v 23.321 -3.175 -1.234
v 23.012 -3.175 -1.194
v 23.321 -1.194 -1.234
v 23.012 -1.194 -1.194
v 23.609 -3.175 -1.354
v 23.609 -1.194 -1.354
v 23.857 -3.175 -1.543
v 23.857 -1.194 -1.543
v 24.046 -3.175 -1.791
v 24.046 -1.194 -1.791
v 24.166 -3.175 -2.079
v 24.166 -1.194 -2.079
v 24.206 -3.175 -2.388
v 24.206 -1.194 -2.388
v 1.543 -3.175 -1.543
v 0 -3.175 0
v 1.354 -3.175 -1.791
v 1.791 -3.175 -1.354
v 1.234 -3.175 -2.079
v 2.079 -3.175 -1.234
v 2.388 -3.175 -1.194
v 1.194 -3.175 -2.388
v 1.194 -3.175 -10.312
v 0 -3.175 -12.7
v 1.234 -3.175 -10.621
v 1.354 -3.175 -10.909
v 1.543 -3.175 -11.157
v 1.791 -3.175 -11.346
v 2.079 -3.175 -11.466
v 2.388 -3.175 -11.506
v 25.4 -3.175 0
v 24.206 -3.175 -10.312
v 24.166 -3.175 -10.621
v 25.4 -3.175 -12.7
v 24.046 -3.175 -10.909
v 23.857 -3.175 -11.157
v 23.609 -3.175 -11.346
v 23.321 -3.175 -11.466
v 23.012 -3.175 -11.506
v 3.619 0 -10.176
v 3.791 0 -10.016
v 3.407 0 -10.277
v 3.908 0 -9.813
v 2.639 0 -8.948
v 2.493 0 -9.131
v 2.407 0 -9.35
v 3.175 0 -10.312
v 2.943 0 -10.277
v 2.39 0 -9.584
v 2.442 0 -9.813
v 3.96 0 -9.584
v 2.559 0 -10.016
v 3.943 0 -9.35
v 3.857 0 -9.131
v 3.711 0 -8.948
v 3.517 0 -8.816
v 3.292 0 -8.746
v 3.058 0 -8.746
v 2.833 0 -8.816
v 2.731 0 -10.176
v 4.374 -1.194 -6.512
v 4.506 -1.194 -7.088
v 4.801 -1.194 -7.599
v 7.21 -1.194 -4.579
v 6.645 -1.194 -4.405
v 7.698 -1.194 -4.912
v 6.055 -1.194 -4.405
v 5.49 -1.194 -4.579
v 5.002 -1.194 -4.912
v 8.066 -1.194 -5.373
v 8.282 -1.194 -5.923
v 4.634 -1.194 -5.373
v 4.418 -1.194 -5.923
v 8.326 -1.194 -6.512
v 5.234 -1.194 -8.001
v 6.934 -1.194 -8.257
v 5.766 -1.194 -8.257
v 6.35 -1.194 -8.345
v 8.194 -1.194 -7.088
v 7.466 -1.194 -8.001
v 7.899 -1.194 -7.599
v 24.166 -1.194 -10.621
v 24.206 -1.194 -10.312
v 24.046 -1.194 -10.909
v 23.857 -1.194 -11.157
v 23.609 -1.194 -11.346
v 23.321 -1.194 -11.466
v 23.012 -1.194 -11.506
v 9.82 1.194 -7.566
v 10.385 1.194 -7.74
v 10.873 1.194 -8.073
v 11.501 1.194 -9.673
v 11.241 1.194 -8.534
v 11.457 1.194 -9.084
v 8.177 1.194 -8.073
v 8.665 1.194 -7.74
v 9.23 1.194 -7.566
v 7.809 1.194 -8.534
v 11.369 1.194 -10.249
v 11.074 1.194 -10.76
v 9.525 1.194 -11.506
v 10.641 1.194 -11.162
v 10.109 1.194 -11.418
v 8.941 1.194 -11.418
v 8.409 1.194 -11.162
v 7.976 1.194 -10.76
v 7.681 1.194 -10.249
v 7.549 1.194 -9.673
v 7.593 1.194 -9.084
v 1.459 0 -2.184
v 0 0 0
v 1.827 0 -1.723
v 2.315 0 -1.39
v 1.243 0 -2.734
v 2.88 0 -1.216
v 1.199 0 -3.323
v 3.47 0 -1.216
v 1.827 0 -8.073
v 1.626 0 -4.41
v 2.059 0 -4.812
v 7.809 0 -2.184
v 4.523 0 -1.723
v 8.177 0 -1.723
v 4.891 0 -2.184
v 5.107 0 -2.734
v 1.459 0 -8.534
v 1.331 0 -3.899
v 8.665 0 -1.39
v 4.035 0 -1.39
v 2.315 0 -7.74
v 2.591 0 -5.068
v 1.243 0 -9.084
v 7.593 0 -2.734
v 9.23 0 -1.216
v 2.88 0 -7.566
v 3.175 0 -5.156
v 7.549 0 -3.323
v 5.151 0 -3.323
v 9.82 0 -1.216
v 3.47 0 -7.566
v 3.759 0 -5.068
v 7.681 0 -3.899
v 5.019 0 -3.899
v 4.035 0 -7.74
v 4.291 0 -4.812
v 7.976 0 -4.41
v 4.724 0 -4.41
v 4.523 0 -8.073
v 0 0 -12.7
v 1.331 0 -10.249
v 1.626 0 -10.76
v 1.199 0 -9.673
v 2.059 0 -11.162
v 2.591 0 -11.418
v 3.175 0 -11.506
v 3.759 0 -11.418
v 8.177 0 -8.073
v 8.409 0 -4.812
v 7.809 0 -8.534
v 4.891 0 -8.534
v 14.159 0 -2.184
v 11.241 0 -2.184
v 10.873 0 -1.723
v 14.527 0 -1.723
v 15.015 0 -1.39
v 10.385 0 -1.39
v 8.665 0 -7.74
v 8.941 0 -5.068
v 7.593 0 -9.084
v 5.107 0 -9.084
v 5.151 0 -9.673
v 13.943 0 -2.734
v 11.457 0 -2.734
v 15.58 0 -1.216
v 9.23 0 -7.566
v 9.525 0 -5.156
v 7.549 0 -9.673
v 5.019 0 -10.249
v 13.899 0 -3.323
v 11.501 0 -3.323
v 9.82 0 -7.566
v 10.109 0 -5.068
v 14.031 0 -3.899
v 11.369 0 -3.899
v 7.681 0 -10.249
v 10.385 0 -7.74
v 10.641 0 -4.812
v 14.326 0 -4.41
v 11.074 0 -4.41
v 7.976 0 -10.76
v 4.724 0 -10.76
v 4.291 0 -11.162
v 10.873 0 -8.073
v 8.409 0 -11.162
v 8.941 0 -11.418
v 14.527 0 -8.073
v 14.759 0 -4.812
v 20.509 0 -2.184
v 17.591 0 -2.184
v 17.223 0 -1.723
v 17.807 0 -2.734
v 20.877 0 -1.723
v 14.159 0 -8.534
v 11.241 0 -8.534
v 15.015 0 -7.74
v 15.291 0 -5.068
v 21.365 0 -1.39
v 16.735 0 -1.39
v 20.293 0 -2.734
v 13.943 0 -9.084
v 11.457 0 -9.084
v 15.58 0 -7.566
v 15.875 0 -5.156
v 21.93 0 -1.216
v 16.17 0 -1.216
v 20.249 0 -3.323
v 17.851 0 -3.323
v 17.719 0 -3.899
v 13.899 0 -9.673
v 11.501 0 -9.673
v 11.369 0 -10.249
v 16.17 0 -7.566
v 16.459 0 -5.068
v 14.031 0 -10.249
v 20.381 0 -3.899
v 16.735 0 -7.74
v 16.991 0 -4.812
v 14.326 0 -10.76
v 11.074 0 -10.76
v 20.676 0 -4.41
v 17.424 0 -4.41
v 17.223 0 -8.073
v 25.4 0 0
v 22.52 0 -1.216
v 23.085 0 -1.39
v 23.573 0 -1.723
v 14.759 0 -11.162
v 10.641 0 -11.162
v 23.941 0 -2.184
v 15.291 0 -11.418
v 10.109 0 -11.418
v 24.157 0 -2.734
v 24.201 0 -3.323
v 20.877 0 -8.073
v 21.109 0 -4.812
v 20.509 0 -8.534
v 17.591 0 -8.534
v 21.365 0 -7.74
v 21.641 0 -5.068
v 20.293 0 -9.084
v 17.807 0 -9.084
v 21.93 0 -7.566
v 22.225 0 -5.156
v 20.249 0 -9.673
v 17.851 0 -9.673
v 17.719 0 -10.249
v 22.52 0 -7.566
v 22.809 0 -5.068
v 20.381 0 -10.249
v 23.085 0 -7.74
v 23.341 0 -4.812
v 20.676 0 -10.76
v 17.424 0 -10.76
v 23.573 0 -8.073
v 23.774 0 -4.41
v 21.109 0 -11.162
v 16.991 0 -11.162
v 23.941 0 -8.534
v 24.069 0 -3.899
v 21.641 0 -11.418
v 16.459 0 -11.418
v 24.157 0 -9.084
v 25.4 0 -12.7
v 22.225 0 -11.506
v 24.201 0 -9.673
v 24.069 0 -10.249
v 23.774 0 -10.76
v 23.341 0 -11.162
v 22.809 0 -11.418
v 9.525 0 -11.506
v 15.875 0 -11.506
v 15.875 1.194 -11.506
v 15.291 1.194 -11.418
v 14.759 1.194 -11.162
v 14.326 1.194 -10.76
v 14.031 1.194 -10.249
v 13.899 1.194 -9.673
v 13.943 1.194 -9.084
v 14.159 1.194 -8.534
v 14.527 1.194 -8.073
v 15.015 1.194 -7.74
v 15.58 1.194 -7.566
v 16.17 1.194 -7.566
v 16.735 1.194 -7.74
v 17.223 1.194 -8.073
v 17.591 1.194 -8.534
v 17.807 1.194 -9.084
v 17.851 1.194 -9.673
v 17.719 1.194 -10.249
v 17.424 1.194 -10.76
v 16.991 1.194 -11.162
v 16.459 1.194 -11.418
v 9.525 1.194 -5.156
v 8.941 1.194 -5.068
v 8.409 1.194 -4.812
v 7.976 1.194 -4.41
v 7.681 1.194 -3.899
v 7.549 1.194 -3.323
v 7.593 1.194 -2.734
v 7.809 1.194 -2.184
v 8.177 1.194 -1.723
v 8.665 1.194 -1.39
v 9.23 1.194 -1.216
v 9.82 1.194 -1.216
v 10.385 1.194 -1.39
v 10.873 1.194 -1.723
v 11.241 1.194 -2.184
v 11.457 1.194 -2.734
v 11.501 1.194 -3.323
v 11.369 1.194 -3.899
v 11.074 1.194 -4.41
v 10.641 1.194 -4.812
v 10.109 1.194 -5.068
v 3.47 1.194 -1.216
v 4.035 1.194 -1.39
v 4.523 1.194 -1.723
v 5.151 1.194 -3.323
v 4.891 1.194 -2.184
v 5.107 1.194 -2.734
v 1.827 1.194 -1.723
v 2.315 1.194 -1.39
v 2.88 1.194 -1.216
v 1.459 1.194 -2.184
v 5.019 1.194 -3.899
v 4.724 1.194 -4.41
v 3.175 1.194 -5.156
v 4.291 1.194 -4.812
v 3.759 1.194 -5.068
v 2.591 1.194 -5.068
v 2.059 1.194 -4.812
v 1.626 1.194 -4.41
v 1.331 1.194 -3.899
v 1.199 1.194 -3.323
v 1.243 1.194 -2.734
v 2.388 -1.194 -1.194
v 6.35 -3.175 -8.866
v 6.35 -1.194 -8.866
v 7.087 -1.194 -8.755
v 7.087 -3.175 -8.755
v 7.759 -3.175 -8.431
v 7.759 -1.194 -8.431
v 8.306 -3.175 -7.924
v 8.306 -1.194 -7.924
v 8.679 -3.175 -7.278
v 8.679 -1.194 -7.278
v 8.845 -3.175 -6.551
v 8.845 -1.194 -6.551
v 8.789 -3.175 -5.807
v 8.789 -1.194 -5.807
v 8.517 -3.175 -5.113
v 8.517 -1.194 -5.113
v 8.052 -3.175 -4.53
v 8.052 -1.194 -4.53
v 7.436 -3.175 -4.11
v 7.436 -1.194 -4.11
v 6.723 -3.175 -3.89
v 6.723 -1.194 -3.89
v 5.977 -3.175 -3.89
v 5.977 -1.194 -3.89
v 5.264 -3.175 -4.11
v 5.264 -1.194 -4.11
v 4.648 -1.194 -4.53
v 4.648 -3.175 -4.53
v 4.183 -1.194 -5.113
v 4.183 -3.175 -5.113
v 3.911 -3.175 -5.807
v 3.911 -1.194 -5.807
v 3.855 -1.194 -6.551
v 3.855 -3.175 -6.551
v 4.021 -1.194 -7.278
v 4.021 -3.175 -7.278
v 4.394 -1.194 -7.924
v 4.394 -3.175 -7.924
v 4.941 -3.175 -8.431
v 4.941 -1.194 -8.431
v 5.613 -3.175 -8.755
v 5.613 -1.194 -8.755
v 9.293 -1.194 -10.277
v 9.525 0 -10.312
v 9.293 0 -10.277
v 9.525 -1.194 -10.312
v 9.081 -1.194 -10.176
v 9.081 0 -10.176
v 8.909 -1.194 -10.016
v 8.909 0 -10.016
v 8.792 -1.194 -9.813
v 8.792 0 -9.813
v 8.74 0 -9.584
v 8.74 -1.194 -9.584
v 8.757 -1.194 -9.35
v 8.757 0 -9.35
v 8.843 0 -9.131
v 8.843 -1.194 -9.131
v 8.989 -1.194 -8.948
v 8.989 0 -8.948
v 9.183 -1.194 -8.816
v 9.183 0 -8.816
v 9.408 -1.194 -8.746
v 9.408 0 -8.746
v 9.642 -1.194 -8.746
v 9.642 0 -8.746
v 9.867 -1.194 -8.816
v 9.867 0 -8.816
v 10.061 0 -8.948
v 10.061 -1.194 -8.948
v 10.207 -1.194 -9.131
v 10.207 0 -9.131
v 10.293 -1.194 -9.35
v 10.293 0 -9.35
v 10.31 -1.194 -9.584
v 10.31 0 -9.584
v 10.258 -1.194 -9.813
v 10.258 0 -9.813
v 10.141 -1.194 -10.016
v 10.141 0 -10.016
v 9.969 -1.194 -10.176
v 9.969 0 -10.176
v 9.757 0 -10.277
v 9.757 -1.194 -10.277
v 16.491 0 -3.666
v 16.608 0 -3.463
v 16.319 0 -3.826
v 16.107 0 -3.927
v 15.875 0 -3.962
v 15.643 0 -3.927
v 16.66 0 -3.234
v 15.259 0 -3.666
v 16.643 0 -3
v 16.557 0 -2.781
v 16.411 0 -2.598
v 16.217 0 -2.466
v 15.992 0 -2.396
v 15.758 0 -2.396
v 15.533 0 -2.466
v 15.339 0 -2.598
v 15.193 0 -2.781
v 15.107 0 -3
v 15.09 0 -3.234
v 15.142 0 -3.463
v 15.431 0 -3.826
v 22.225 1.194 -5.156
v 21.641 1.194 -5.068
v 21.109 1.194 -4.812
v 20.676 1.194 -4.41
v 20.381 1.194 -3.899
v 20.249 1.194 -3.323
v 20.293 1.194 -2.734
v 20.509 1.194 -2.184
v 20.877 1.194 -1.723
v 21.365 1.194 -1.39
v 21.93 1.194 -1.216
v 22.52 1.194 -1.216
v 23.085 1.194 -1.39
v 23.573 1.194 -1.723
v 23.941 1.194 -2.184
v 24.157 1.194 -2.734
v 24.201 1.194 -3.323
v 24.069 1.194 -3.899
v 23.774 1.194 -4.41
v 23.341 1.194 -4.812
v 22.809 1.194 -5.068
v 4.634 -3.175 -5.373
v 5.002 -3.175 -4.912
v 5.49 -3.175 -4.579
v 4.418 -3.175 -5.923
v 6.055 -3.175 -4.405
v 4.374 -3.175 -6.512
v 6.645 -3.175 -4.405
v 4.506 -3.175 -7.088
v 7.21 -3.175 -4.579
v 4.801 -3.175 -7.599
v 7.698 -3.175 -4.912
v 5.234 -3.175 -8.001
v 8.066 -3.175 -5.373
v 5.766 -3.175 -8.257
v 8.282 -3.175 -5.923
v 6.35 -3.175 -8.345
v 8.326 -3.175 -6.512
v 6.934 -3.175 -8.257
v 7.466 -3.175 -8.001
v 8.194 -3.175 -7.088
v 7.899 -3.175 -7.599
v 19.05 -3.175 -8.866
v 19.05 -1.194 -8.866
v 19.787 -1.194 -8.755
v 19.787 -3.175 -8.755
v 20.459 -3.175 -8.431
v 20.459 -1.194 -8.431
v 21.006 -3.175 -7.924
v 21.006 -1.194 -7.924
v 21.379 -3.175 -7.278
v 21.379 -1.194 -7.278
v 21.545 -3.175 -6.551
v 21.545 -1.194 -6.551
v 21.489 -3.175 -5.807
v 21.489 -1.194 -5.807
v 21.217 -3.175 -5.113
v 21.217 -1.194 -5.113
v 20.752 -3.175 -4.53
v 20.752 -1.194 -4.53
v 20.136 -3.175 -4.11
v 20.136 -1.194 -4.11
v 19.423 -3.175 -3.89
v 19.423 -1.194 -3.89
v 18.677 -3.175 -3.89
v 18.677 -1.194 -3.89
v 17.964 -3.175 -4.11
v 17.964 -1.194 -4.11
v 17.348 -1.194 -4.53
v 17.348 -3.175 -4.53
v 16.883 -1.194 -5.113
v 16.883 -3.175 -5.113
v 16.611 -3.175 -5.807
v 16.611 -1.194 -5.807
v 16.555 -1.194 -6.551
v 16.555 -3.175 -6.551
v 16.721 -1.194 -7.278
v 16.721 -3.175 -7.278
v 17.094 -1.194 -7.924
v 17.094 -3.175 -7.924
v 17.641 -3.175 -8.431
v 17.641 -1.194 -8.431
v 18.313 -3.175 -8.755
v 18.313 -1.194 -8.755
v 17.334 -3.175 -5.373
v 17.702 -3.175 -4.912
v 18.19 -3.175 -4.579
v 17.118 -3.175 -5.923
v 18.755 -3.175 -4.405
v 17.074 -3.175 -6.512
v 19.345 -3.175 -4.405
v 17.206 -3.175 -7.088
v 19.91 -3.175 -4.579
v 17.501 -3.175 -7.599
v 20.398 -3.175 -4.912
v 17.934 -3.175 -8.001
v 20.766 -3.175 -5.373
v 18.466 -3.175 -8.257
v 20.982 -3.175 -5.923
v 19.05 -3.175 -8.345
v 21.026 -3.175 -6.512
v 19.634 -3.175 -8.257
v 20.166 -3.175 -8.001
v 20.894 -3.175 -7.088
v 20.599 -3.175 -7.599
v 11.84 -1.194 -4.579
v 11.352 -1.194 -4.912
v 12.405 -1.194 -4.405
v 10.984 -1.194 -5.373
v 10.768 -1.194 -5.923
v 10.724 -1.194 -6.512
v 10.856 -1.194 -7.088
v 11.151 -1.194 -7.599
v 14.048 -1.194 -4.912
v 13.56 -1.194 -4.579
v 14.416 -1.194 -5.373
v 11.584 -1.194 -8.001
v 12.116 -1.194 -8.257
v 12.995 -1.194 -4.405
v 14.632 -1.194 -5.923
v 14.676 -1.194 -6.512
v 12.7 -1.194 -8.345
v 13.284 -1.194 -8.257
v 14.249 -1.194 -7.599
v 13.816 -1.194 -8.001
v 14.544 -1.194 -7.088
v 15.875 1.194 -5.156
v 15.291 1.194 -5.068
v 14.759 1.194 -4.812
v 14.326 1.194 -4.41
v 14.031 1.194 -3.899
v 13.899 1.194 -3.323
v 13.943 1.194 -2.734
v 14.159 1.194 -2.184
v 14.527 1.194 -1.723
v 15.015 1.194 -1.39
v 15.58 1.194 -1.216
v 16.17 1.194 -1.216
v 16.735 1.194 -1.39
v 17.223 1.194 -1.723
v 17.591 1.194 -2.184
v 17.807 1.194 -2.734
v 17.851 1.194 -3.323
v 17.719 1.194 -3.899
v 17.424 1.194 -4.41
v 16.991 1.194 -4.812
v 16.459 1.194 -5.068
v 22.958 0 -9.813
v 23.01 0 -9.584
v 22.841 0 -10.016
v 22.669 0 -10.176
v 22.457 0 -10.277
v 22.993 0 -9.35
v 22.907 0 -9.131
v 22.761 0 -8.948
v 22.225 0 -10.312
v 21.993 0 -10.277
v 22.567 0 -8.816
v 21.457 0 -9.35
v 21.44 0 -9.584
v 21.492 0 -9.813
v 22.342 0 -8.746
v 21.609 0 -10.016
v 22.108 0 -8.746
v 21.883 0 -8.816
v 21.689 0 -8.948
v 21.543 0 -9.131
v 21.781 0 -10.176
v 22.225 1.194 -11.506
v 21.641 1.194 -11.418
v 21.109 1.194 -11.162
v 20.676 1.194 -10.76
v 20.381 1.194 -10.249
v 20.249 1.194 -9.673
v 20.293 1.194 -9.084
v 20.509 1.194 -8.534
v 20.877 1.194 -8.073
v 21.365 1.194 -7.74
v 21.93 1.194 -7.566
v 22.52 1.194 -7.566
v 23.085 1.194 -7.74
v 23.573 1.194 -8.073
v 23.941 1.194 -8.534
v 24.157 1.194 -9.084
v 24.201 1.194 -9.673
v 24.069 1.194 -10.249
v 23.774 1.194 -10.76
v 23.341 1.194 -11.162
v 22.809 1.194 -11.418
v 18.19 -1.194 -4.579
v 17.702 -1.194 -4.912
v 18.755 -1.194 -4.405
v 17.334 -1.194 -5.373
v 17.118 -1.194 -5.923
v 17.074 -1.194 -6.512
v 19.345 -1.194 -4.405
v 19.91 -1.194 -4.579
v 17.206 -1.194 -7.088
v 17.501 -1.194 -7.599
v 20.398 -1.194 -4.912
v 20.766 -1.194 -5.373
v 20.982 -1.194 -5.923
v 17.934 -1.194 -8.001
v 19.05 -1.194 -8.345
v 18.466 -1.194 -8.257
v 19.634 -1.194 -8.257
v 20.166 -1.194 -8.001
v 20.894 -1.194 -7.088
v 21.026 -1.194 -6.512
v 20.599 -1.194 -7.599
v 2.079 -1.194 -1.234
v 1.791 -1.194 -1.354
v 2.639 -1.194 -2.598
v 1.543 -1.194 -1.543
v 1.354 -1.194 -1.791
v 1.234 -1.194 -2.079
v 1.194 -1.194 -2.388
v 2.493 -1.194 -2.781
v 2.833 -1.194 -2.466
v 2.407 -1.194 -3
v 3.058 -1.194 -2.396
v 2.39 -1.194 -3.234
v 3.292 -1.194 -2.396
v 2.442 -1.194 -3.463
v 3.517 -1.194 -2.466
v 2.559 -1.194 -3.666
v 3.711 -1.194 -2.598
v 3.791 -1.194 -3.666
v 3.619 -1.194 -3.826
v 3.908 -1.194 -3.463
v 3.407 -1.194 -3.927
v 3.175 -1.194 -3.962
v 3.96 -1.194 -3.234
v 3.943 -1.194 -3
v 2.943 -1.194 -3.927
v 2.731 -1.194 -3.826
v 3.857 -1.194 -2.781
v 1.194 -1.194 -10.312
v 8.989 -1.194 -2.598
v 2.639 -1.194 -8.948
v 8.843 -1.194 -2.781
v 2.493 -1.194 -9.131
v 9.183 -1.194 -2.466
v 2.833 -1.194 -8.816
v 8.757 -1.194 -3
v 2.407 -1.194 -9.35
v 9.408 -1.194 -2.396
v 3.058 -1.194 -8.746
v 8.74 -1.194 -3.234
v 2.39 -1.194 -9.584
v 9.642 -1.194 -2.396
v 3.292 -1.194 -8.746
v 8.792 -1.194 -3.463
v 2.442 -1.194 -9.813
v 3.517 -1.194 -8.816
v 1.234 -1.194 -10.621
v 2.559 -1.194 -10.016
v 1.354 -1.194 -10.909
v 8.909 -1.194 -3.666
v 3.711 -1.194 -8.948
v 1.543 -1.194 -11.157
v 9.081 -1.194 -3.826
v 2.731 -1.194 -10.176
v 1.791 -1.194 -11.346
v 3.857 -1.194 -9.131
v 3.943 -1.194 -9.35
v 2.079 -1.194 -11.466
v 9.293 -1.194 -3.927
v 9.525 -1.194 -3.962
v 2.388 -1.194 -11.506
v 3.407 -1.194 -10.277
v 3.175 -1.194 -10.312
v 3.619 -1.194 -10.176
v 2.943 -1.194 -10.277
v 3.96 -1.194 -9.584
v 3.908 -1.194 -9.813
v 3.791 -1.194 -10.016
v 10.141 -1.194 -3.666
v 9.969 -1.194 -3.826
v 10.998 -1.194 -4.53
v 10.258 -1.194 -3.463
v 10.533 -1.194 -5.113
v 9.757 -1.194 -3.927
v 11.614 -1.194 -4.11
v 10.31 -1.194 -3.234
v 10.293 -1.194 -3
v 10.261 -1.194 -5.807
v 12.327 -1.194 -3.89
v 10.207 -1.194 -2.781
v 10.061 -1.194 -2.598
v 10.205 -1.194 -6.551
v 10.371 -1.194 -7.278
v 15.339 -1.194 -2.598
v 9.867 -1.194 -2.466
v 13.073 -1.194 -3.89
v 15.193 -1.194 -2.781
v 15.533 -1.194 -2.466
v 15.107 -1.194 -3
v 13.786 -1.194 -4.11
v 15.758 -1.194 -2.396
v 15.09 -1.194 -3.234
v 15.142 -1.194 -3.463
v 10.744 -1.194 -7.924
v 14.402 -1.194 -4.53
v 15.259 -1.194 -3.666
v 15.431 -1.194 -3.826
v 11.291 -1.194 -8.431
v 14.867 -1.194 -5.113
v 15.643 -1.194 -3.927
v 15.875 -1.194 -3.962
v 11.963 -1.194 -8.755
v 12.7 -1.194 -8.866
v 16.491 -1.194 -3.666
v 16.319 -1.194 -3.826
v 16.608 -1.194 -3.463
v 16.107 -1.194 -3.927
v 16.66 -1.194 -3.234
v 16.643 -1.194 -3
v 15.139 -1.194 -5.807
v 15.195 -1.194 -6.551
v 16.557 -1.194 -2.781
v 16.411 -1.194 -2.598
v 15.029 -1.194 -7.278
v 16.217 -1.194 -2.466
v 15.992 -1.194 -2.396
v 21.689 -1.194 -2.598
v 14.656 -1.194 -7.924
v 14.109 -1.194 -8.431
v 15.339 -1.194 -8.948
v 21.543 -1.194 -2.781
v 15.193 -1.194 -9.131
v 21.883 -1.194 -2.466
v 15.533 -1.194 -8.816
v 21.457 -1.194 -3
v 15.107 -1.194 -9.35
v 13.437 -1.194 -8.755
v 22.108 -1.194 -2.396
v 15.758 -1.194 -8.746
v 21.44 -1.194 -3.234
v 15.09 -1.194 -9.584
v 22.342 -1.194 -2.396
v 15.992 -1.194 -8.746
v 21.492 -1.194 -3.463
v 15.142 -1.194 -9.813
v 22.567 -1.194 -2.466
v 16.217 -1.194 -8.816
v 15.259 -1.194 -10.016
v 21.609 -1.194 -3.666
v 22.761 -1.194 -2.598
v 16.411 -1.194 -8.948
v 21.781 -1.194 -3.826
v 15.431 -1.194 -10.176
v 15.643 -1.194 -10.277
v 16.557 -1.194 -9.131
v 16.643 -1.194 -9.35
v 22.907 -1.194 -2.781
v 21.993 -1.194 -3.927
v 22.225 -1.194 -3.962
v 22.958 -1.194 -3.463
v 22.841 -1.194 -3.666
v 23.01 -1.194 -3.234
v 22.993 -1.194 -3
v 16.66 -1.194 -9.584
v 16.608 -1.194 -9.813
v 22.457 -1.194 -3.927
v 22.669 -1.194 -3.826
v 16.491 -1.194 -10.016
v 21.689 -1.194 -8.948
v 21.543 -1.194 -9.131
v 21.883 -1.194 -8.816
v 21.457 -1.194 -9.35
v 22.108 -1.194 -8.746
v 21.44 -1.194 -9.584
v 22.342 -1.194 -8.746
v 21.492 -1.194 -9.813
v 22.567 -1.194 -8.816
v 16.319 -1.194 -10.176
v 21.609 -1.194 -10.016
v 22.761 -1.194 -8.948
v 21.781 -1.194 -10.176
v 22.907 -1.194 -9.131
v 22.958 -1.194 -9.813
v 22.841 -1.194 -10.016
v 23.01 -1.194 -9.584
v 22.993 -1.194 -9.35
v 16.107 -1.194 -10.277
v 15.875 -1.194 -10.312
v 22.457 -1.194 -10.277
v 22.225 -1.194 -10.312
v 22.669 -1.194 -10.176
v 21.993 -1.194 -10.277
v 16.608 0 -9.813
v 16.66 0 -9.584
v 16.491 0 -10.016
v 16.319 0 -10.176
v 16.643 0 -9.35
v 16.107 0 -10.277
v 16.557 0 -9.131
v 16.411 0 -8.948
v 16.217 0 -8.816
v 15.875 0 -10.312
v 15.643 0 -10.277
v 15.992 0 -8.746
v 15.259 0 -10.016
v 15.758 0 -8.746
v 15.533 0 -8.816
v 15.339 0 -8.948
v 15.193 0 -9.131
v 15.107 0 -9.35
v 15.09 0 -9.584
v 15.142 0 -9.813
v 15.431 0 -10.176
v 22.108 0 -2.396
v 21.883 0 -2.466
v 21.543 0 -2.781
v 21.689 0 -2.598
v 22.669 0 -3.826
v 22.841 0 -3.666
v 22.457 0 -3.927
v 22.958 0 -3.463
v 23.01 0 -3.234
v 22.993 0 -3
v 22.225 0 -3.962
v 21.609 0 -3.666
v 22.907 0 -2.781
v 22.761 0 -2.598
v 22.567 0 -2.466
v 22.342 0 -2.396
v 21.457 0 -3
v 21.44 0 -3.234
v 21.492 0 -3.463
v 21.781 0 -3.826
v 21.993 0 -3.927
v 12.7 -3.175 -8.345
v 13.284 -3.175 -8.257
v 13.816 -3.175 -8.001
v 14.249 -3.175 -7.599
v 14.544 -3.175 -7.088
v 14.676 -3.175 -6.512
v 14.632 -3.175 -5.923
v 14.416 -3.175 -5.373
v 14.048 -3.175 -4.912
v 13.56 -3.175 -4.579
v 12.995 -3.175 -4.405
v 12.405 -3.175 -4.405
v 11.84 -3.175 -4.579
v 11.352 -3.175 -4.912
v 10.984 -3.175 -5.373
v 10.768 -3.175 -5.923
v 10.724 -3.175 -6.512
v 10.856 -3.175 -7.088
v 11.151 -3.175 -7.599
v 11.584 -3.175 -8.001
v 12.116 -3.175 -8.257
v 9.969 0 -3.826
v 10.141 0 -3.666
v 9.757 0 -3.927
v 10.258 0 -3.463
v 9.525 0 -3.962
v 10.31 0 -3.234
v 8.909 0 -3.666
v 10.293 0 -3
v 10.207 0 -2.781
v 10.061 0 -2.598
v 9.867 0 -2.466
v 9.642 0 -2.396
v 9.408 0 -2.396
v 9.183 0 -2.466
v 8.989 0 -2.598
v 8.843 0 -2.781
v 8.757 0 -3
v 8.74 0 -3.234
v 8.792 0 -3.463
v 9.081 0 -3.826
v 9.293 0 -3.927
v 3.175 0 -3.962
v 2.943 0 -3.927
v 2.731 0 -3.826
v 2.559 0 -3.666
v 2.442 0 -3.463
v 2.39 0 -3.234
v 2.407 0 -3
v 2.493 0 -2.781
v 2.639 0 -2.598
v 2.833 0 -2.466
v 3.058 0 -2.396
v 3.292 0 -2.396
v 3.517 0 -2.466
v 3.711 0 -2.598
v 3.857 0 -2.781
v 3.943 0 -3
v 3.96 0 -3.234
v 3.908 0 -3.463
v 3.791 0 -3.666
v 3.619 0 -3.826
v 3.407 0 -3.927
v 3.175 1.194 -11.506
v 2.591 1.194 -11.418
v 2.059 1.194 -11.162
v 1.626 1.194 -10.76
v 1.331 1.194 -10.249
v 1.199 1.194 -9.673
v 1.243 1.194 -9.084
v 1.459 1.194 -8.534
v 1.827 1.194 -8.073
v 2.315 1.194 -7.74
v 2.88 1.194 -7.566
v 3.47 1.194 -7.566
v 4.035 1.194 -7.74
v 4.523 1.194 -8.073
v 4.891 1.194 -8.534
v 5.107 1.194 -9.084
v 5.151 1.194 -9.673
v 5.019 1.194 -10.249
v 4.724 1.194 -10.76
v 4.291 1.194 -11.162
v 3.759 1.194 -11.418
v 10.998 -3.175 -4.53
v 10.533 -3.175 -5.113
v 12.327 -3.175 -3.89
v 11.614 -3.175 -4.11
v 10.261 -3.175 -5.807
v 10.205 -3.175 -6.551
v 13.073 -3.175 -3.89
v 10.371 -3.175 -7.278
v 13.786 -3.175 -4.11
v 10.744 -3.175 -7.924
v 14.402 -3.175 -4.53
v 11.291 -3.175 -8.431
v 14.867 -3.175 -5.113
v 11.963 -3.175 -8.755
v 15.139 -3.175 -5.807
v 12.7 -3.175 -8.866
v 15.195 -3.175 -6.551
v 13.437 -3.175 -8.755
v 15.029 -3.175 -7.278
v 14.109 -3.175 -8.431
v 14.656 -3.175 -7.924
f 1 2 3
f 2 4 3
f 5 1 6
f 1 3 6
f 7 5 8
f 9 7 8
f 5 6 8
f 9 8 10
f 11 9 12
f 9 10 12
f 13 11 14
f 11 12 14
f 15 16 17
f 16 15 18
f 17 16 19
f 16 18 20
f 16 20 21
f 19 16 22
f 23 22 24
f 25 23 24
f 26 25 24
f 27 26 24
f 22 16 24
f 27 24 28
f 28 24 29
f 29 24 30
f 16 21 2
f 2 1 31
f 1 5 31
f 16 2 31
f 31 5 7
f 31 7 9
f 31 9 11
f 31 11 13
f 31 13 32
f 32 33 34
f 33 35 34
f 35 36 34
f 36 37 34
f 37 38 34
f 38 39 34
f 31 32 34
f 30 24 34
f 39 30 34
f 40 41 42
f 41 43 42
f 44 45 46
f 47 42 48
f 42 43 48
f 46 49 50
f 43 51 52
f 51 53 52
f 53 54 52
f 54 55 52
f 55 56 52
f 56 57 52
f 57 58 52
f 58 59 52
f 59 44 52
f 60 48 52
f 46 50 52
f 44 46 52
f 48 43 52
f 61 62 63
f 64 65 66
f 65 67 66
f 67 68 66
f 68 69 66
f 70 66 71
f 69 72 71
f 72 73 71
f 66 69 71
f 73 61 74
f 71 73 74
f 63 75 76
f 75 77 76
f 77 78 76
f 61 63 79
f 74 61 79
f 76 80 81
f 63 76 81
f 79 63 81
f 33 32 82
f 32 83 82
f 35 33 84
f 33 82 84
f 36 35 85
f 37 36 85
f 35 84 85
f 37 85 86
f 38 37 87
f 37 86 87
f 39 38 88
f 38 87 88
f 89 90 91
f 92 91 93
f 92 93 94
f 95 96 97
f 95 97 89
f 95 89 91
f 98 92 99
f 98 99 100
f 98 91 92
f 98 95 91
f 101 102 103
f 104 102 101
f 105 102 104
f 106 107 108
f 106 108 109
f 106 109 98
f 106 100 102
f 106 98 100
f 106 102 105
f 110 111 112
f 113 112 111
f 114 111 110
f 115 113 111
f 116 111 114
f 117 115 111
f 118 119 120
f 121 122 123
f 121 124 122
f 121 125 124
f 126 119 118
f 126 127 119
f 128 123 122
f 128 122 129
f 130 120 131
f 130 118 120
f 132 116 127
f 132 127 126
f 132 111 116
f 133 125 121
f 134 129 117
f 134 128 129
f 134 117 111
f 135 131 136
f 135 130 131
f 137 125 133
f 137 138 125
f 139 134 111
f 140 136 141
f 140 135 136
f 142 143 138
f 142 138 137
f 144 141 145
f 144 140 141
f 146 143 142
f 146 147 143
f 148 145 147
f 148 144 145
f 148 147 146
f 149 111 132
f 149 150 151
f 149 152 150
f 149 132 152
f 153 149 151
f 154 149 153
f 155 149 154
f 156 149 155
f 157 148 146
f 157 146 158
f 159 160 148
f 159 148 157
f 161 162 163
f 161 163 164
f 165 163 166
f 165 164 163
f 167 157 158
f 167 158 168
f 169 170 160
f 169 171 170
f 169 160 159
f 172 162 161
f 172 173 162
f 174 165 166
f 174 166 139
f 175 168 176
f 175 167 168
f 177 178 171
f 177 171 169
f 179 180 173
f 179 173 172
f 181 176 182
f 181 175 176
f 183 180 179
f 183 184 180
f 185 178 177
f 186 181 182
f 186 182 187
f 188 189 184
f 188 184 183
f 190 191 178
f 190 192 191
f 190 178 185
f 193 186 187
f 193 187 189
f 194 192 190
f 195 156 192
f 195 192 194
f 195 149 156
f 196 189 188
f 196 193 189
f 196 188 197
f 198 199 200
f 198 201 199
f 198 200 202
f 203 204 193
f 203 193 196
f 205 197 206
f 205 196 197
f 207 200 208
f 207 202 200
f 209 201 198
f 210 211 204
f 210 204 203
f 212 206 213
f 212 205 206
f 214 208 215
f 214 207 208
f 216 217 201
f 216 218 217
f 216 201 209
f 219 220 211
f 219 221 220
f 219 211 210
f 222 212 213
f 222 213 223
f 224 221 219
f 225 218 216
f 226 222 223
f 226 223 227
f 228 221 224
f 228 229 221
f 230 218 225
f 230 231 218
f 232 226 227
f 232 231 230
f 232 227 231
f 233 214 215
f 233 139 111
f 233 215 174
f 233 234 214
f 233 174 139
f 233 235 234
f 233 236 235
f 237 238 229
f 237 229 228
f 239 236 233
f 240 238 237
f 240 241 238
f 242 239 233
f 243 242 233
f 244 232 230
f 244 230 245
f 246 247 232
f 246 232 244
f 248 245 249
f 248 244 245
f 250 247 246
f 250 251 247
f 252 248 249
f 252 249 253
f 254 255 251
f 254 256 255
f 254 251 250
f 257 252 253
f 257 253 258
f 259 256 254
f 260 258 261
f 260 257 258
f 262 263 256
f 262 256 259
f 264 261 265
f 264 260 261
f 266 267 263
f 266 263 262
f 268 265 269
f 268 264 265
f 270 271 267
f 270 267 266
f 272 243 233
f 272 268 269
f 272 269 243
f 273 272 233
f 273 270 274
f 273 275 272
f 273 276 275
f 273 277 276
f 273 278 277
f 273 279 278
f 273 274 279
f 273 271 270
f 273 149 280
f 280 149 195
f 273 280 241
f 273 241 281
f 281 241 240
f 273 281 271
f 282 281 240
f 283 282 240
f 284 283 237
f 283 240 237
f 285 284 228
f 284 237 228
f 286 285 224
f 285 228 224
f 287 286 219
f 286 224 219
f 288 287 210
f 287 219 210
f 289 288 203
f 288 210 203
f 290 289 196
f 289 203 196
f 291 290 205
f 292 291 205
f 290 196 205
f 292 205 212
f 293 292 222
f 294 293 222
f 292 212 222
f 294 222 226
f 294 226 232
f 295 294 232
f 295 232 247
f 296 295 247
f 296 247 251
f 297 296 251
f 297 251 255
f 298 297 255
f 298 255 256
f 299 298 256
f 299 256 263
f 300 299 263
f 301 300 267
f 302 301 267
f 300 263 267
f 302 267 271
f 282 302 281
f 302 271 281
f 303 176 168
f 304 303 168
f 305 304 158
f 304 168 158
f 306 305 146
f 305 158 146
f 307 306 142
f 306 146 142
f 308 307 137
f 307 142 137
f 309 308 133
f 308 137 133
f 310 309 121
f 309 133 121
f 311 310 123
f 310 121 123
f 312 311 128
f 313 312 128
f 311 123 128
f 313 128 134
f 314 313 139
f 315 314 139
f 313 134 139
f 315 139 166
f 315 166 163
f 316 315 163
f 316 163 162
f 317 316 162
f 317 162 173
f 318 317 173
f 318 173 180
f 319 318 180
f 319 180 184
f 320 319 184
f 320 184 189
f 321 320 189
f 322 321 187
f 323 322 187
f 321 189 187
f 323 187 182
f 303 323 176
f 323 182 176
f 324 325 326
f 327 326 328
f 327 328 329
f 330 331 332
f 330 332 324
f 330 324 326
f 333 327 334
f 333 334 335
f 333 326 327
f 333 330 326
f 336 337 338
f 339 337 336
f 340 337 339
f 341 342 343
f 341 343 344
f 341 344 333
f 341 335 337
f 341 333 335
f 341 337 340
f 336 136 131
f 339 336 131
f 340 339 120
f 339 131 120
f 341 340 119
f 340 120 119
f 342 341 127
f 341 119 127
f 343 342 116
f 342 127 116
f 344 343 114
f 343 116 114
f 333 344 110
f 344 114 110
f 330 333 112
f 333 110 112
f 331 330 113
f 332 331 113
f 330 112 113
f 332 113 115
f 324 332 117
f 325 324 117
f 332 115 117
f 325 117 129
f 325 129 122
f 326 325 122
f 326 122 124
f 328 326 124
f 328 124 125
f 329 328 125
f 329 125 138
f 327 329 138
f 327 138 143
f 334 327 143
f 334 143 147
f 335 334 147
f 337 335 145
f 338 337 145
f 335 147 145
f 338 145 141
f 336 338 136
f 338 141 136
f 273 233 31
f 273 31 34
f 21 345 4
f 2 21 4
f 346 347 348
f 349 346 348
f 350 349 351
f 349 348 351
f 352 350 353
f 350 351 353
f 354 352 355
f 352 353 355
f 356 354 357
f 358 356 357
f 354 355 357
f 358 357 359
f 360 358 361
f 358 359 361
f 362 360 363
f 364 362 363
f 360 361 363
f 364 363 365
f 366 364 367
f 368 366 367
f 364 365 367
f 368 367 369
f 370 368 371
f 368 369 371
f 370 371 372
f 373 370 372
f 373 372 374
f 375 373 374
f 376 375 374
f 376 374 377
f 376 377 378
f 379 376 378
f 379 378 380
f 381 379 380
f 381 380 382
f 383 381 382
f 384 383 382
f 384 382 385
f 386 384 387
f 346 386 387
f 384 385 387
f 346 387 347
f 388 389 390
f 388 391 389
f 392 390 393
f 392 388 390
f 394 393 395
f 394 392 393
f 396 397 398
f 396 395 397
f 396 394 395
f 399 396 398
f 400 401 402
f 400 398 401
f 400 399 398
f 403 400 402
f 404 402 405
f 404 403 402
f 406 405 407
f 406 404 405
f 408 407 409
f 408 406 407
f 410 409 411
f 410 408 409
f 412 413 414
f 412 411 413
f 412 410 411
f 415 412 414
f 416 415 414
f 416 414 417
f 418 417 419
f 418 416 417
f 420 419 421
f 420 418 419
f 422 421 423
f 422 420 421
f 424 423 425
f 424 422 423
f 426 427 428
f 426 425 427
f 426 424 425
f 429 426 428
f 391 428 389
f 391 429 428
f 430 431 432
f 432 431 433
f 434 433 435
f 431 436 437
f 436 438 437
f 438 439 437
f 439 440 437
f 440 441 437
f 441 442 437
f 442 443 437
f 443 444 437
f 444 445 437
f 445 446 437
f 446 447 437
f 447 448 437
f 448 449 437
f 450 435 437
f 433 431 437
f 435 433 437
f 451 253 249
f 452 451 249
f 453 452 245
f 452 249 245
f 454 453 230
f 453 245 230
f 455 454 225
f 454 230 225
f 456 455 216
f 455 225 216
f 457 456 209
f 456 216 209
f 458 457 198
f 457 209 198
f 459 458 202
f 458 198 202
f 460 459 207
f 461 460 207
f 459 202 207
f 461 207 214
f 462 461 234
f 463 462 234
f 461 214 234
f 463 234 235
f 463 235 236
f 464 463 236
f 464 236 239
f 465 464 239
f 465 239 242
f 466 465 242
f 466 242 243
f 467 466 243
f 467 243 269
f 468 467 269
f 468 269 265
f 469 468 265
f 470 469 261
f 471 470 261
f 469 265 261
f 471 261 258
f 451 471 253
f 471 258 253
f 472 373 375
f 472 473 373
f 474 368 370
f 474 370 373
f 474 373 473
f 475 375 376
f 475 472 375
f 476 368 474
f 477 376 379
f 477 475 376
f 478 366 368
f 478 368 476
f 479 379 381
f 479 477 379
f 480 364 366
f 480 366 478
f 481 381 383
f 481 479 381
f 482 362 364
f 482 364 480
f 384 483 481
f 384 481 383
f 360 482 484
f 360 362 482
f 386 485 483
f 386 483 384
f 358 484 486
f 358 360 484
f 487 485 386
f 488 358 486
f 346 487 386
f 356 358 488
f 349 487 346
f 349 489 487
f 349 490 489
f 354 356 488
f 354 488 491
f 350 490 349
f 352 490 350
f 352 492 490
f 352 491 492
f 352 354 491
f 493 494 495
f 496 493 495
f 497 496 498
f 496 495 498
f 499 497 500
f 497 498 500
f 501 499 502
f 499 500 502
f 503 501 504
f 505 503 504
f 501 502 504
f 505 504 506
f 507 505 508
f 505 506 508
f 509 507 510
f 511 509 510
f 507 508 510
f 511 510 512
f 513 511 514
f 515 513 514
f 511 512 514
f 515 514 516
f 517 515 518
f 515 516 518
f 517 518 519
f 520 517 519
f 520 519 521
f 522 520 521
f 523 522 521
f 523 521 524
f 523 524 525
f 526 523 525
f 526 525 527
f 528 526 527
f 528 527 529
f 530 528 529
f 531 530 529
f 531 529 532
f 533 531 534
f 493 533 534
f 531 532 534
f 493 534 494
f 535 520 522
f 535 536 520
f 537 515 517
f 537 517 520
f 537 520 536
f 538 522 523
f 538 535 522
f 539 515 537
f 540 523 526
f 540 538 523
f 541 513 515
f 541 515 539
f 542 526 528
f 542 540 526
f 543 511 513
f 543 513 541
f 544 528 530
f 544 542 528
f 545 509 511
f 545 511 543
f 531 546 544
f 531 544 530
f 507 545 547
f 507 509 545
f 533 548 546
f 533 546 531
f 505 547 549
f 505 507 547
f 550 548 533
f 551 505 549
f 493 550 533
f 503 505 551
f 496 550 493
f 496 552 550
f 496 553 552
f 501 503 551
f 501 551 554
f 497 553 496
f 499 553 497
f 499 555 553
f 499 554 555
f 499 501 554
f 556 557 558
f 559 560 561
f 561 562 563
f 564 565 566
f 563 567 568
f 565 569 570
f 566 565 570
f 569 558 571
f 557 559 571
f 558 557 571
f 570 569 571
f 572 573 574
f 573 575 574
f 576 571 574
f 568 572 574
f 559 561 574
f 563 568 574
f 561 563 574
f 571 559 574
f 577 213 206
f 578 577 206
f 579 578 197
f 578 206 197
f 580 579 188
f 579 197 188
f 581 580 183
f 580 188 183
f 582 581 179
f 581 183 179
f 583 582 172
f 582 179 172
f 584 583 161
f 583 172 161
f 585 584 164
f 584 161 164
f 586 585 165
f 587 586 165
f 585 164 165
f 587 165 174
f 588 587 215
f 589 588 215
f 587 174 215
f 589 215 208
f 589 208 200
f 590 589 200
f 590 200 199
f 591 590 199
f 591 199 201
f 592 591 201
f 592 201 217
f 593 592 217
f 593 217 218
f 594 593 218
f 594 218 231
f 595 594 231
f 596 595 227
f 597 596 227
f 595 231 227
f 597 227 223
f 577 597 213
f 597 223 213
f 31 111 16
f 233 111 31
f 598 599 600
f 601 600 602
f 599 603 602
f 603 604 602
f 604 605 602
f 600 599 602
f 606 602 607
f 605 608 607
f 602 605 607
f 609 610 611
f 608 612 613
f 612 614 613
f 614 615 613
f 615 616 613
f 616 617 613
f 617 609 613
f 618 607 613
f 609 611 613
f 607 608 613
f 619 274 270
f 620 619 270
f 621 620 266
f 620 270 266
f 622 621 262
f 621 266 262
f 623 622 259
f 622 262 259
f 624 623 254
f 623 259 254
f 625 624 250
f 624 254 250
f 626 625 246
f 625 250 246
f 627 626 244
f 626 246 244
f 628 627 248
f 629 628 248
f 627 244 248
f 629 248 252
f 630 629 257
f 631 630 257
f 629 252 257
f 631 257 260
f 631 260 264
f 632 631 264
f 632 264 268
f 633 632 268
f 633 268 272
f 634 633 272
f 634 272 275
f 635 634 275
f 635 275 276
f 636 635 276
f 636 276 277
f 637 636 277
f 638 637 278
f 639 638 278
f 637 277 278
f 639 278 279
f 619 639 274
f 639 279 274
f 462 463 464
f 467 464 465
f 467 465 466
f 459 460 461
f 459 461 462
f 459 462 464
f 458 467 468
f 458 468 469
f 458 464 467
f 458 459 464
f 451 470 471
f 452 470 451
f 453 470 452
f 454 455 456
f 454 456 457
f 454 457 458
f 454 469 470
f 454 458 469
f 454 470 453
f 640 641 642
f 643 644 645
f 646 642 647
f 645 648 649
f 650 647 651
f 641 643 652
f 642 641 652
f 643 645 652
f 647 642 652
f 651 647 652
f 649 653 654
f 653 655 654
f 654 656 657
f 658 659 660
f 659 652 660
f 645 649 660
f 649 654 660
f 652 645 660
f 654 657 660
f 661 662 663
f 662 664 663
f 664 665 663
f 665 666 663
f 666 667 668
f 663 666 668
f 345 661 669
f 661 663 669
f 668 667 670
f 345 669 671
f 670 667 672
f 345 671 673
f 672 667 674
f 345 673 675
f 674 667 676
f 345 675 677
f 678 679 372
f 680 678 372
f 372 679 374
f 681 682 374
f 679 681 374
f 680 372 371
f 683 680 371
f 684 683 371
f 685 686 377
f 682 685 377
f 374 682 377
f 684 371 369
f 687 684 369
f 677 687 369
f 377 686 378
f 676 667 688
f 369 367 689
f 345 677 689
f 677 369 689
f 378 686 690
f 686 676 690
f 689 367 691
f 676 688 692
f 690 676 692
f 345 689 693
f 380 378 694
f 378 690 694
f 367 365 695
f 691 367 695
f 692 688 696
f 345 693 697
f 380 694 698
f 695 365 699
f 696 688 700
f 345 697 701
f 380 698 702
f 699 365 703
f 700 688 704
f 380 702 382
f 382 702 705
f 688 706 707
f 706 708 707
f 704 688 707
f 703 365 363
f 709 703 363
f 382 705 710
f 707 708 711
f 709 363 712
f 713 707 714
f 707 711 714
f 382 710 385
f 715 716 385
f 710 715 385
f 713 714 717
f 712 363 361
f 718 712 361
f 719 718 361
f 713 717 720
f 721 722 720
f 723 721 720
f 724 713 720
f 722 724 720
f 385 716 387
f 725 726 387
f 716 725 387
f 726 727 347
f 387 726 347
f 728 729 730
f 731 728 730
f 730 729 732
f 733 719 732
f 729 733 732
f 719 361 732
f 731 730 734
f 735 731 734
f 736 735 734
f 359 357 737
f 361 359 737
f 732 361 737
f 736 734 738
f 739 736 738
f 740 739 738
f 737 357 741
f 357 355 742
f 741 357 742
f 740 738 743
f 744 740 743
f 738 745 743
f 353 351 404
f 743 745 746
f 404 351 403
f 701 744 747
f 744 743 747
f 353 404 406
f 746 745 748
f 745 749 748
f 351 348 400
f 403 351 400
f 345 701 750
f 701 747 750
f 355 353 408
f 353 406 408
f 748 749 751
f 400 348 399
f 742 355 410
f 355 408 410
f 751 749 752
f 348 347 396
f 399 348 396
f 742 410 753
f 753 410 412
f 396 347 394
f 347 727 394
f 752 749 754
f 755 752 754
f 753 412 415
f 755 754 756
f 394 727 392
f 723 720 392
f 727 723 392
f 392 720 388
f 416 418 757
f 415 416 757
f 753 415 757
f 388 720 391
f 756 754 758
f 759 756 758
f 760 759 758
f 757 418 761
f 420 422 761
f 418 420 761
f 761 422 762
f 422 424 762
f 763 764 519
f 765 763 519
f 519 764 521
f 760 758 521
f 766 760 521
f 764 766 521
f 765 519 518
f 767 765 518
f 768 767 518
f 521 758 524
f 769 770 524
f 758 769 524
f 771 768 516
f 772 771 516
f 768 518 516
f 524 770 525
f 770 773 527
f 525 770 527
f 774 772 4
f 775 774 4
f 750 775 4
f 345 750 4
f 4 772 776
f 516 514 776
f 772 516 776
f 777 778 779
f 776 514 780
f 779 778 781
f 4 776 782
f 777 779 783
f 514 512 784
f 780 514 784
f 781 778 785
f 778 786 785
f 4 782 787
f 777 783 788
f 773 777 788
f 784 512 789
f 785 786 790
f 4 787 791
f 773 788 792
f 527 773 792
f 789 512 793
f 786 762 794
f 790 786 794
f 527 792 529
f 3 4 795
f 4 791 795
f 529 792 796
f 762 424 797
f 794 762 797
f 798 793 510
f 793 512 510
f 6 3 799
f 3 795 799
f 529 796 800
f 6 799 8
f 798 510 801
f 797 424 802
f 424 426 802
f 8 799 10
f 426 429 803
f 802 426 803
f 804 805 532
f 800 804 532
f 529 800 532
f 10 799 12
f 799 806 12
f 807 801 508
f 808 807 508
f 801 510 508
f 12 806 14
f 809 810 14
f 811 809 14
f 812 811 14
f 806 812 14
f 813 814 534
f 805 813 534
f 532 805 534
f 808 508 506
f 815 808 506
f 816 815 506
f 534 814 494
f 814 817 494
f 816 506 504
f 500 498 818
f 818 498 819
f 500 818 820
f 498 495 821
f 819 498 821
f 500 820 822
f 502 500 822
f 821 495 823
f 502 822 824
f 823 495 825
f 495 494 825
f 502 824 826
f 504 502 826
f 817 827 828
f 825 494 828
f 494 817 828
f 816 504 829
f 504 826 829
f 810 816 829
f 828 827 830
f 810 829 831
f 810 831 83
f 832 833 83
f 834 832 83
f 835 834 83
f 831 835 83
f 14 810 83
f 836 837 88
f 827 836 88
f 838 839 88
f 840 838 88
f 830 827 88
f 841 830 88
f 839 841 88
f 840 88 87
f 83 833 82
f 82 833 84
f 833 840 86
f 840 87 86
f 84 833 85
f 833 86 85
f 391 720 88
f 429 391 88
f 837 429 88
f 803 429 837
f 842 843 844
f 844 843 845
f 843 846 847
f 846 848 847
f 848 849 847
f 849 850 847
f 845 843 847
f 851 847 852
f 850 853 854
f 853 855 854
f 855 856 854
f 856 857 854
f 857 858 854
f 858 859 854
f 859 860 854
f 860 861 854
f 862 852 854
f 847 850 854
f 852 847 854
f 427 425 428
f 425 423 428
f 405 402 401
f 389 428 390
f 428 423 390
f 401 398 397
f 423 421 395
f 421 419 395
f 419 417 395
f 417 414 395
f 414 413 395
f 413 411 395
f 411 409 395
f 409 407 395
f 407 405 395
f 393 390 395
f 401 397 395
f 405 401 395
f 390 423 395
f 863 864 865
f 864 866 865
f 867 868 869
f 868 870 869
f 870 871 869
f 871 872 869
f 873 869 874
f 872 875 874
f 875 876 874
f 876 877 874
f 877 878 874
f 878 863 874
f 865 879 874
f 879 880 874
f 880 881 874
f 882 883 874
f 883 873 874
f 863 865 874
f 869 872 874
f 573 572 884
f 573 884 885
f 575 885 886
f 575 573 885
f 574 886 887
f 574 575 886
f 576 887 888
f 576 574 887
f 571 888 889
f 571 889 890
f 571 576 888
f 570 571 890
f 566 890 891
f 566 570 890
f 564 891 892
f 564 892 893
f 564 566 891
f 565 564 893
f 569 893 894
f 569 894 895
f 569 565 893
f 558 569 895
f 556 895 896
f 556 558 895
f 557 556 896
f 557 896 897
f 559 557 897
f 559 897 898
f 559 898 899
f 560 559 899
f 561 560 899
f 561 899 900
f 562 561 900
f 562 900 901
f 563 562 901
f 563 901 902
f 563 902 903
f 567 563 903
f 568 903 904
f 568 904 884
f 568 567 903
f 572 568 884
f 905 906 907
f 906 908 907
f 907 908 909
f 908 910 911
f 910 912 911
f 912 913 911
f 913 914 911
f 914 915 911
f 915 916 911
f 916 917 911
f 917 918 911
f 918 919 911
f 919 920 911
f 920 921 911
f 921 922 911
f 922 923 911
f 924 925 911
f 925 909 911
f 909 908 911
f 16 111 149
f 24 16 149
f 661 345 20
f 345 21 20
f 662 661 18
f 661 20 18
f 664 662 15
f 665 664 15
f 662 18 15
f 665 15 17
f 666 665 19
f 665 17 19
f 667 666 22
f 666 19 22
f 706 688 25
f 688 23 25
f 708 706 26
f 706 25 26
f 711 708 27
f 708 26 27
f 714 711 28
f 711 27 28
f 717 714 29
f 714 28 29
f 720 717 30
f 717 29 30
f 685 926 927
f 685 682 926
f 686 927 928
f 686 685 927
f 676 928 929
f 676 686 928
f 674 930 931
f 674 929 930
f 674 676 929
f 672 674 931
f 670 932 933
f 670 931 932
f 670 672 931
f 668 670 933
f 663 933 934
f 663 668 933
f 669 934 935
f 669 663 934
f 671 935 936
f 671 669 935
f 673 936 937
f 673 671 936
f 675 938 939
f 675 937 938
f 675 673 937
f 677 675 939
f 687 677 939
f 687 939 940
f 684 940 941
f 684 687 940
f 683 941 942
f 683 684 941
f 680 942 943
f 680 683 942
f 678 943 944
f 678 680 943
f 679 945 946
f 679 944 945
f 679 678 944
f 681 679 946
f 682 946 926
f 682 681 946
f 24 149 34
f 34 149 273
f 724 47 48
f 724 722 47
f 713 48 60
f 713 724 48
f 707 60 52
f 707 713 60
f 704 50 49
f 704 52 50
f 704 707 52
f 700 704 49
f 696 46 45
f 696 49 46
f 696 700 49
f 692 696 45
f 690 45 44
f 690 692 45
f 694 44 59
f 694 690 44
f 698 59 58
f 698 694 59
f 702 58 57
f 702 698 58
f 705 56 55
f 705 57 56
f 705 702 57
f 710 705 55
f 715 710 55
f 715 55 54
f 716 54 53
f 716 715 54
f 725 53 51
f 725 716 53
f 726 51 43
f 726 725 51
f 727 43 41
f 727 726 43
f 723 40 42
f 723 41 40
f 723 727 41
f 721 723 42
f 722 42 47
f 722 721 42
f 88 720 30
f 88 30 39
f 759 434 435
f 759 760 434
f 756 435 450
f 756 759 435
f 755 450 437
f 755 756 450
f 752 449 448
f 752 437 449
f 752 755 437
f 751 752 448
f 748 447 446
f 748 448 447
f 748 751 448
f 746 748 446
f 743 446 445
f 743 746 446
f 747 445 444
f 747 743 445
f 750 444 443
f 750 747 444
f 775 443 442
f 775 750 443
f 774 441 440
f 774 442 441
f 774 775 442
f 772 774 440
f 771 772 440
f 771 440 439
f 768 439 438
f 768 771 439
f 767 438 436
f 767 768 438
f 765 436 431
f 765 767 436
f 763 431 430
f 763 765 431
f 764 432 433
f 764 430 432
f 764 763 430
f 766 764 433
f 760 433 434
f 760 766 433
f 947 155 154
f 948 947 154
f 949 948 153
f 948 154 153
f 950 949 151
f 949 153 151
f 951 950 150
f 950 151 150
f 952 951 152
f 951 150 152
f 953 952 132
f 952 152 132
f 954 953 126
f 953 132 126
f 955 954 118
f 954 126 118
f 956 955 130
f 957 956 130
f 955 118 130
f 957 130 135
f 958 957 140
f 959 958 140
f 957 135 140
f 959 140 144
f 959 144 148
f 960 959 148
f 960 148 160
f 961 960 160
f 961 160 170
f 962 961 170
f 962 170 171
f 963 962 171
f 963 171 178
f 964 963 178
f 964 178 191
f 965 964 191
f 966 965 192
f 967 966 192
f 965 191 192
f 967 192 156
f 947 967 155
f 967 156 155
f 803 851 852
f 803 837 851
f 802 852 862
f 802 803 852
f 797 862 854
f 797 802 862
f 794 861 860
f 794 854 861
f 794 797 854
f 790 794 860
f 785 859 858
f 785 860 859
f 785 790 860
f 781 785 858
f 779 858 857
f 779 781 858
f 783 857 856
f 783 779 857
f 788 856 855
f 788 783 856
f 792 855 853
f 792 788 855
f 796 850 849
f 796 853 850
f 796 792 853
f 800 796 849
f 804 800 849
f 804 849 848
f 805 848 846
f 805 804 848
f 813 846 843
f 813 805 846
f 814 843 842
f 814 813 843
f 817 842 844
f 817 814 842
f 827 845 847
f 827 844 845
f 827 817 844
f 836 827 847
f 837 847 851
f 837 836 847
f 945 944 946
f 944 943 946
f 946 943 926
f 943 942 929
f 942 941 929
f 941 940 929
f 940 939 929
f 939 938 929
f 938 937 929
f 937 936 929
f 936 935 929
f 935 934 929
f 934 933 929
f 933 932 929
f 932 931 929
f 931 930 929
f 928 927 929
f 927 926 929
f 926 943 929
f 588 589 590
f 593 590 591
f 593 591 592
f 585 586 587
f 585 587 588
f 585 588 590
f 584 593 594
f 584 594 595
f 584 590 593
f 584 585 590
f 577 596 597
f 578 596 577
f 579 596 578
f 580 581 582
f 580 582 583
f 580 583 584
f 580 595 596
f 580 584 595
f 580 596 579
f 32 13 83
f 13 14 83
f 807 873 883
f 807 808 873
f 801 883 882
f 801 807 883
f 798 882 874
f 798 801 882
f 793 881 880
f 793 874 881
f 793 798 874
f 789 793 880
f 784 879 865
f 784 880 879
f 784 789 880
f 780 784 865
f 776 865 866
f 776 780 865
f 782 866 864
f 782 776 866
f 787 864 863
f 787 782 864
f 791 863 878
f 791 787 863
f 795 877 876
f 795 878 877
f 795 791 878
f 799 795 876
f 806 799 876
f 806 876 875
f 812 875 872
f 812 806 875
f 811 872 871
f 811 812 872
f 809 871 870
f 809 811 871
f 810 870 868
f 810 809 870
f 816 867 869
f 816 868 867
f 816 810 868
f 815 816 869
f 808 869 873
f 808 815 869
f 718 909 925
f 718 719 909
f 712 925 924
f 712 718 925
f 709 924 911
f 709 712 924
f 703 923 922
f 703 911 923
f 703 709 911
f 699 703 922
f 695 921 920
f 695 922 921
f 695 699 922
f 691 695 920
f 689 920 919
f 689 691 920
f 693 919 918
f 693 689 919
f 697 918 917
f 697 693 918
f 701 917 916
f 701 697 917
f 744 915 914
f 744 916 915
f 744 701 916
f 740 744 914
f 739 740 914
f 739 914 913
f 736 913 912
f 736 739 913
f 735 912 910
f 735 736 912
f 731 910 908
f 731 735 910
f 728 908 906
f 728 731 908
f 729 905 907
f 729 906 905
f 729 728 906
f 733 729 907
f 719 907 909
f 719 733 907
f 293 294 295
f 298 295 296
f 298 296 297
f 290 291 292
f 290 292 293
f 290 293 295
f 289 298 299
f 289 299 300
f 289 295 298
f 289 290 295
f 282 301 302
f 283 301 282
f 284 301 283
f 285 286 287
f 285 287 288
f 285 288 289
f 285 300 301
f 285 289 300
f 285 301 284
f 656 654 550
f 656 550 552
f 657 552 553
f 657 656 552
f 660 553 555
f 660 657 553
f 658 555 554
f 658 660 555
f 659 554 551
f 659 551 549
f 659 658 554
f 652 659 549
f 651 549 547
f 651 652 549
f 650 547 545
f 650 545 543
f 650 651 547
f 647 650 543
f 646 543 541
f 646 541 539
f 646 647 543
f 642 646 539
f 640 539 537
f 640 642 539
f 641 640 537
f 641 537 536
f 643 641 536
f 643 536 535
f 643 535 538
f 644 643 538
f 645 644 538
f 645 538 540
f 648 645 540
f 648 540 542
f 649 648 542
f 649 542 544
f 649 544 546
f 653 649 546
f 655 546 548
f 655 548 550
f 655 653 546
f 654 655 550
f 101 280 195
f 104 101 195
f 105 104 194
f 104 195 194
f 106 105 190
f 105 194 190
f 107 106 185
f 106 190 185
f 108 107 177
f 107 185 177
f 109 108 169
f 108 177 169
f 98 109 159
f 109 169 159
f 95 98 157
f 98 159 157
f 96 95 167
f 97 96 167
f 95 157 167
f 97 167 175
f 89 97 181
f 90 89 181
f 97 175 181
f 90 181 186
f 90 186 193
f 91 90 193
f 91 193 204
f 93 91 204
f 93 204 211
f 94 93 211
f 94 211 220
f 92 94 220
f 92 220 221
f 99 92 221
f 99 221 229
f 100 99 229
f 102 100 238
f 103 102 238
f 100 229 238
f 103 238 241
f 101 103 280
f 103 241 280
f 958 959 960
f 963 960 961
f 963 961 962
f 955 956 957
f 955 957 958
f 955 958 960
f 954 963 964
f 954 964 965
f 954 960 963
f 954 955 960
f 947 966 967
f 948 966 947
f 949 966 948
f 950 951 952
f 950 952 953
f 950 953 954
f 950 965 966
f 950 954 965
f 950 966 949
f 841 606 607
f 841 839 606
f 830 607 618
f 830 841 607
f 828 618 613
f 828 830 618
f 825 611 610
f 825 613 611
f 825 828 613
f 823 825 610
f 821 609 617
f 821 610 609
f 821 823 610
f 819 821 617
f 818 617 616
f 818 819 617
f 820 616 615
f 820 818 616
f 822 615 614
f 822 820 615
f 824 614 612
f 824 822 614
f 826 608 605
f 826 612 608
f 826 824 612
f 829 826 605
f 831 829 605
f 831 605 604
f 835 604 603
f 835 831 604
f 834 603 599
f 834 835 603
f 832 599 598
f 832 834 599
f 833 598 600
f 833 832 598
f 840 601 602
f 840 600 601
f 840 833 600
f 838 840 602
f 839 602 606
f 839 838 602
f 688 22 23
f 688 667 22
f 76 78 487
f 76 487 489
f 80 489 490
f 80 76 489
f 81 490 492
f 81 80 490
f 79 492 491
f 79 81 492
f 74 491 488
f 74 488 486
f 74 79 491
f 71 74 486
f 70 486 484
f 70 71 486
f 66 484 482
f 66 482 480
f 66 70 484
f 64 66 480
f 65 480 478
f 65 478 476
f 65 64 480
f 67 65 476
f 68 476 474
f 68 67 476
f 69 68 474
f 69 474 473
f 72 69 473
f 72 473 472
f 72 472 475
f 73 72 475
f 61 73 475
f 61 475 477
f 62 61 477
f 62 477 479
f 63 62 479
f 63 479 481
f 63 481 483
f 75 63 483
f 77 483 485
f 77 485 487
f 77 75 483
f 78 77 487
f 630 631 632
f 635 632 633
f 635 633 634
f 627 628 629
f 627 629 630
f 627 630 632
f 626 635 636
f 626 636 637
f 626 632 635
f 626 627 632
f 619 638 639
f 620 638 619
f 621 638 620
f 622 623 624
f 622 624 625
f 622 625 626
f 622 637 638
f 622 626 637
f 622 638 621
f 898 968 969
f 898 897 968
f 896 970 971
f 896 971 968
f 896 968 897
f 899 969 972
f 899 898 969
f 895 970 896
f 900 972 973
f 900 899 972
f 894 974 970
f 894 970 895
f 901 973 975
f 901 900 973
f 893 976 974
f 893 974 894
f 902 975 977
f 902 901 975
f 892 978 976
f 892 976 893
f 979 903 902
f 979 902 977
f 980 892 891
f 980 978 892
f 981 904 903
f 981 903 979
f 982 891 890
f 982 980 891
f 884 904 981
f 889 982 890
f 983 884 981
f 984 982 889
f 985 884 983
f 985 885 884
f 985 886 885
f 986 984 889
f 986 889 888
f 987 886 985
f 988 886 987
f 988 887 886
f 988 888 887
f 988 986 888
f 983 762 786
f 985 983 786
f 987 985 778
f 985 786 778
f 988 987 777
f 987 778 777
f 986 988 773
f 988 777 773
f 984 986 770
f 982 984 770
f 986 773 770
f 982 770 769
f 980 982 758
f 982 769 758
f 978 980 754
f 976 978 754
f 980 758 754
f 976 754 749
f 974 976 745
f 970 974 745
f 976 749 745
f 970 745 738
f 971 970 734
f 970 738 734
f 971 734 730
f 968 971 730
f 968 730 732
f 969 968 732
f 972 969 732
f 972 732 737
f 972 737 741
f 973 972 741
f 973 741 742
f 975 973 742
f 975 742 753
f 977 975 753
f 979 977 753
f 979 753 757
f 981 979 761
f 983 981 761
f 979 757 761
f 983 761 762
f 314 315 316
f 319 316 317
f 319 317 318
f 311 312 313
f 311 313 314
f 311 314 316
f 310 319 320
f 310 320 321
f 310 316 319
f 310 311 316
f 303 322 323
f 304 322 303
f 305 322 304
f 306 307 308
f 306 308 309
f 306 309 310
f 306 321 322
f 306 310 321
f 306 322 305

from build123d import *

# Parameters (mm, degrees)
SKETCH2_W            = 25.4
SKETCH2_H            = 12.7
BOSS_EXTRUDE1_DEPTH  = 3.175
SKETCH2_3_R          = 1.9812
BOSS_EXTRUDE2_DEPTH  = 1.1938
LPATTERN1_COUNT      = 4
LPATTERN1_PITCH      = 6.35
LPATTERN1_COUNT_DIR2 = 2
LPATTERN1_PITCH_DIR2 = 6.35
SHELL1_T             = -1.1938
SKETCH4_R            = 2.5019
SKETCH4_R_2          = 1.9812
BOSS_EXTRUDE3_DEPTH  = 1.9812
FILLET1_R            = 1.1938
FILLET2_R            = 1.1938
LPATTERN2_COUNT      = 3
LPATTERN2_PITCH      = 6.35


with BuildPart() as part:
    # Sketch2 → Boss-Extrude1 (new body)
    with BuildSketch(Plane(origin=(0, 0, 0), x_dir=(1, 0, 0), z_dir=(0, 1, 0))):
        with Locations((12.7, 6.35)):
            Rectangle(SKETCH2_W, SKETCH2_H)
    extrude(amount=-BOSS_EXTRUDE1_DEPTH)

    # Sketch2<3> → Boss-Extrude2 (add)
    with BuildSketch(Plane(origin=(0, 0, 0), x_dir=(1, 0, 0), z_dir=(0, 1, 0))):
        with Locations(Location((3.175, 9.525, 0), (0, 0, 90))):
            Circle(SKETCH2_3_R)
    boss_extrude2 = extrude(amount=BOSS_EXTRUDE2_DEPTH)

    # LPattern1: Boss-Extrude2 4 × 2
    with Locations(*[(i * LPATTERN1_PITCH, 0, j * LPATTERN1_PITCH_DIR2) for i in range(LPATTERN1_COUNT) for j in range(LPATTERN1_COUNT_DIR2) if (i, j) != (0, 0)]):
        add(boss_extrude2)

    # Shell1
    shell1_openings = [part.faces().sort_by_distance(p)[0] for p in [
        (12.7, -3.175, -6.35),
    ]]
    offset(amount=SHELL1_T, openings=shell1_openings, kind=Kind.INTERSECTION)

    # Sketch4 → Boss-Extrude3 (add)
    with BuildSketch(Plane.XZ.offset(1.1938)):
        with Locations(Location((6.35, -6.363913067, 0), (0, 0, 270))):
            Circle(SKETCH4_R)
        with Locations(Location((6.35, -6.363913067, 0), (0, 0, 270))):
            Circle(SKETCH4_R_2, mode=Mode.SUBTRACT)
    boss_extrude3 = extrude(amount=BOSS_EXTRUDE3_DEPTH)

    # Fillet1
    fillet1_edges = [part.edges().sort_by_distance(p)[0] for p in [
        (1.1938, -2.1844, -1.1938),
    ]]
    fillet(fillet1_edges, radius=FILLET1_R)

    # Fillet2
    fillet2_edges = [part.edges().sort_by_distance(p)[0] for p in [
        (1.1938, -2.1844, -11.5062),
        (24.2062, -2.1844, -11.5062),
        (24.2062, -2.1844, -1.1938),
    ]]
    fillet(fillet2_edges, radius=FILLET2_R)

    # LPattern2: Boss-Extrude3 ×3
    with Locations(*[(i * LPATTERN2_PITCH, 0, 0) for i in range(1, LPATTERN2_COUNT)]):
        add(boss_extrude3)


solid = part.part
